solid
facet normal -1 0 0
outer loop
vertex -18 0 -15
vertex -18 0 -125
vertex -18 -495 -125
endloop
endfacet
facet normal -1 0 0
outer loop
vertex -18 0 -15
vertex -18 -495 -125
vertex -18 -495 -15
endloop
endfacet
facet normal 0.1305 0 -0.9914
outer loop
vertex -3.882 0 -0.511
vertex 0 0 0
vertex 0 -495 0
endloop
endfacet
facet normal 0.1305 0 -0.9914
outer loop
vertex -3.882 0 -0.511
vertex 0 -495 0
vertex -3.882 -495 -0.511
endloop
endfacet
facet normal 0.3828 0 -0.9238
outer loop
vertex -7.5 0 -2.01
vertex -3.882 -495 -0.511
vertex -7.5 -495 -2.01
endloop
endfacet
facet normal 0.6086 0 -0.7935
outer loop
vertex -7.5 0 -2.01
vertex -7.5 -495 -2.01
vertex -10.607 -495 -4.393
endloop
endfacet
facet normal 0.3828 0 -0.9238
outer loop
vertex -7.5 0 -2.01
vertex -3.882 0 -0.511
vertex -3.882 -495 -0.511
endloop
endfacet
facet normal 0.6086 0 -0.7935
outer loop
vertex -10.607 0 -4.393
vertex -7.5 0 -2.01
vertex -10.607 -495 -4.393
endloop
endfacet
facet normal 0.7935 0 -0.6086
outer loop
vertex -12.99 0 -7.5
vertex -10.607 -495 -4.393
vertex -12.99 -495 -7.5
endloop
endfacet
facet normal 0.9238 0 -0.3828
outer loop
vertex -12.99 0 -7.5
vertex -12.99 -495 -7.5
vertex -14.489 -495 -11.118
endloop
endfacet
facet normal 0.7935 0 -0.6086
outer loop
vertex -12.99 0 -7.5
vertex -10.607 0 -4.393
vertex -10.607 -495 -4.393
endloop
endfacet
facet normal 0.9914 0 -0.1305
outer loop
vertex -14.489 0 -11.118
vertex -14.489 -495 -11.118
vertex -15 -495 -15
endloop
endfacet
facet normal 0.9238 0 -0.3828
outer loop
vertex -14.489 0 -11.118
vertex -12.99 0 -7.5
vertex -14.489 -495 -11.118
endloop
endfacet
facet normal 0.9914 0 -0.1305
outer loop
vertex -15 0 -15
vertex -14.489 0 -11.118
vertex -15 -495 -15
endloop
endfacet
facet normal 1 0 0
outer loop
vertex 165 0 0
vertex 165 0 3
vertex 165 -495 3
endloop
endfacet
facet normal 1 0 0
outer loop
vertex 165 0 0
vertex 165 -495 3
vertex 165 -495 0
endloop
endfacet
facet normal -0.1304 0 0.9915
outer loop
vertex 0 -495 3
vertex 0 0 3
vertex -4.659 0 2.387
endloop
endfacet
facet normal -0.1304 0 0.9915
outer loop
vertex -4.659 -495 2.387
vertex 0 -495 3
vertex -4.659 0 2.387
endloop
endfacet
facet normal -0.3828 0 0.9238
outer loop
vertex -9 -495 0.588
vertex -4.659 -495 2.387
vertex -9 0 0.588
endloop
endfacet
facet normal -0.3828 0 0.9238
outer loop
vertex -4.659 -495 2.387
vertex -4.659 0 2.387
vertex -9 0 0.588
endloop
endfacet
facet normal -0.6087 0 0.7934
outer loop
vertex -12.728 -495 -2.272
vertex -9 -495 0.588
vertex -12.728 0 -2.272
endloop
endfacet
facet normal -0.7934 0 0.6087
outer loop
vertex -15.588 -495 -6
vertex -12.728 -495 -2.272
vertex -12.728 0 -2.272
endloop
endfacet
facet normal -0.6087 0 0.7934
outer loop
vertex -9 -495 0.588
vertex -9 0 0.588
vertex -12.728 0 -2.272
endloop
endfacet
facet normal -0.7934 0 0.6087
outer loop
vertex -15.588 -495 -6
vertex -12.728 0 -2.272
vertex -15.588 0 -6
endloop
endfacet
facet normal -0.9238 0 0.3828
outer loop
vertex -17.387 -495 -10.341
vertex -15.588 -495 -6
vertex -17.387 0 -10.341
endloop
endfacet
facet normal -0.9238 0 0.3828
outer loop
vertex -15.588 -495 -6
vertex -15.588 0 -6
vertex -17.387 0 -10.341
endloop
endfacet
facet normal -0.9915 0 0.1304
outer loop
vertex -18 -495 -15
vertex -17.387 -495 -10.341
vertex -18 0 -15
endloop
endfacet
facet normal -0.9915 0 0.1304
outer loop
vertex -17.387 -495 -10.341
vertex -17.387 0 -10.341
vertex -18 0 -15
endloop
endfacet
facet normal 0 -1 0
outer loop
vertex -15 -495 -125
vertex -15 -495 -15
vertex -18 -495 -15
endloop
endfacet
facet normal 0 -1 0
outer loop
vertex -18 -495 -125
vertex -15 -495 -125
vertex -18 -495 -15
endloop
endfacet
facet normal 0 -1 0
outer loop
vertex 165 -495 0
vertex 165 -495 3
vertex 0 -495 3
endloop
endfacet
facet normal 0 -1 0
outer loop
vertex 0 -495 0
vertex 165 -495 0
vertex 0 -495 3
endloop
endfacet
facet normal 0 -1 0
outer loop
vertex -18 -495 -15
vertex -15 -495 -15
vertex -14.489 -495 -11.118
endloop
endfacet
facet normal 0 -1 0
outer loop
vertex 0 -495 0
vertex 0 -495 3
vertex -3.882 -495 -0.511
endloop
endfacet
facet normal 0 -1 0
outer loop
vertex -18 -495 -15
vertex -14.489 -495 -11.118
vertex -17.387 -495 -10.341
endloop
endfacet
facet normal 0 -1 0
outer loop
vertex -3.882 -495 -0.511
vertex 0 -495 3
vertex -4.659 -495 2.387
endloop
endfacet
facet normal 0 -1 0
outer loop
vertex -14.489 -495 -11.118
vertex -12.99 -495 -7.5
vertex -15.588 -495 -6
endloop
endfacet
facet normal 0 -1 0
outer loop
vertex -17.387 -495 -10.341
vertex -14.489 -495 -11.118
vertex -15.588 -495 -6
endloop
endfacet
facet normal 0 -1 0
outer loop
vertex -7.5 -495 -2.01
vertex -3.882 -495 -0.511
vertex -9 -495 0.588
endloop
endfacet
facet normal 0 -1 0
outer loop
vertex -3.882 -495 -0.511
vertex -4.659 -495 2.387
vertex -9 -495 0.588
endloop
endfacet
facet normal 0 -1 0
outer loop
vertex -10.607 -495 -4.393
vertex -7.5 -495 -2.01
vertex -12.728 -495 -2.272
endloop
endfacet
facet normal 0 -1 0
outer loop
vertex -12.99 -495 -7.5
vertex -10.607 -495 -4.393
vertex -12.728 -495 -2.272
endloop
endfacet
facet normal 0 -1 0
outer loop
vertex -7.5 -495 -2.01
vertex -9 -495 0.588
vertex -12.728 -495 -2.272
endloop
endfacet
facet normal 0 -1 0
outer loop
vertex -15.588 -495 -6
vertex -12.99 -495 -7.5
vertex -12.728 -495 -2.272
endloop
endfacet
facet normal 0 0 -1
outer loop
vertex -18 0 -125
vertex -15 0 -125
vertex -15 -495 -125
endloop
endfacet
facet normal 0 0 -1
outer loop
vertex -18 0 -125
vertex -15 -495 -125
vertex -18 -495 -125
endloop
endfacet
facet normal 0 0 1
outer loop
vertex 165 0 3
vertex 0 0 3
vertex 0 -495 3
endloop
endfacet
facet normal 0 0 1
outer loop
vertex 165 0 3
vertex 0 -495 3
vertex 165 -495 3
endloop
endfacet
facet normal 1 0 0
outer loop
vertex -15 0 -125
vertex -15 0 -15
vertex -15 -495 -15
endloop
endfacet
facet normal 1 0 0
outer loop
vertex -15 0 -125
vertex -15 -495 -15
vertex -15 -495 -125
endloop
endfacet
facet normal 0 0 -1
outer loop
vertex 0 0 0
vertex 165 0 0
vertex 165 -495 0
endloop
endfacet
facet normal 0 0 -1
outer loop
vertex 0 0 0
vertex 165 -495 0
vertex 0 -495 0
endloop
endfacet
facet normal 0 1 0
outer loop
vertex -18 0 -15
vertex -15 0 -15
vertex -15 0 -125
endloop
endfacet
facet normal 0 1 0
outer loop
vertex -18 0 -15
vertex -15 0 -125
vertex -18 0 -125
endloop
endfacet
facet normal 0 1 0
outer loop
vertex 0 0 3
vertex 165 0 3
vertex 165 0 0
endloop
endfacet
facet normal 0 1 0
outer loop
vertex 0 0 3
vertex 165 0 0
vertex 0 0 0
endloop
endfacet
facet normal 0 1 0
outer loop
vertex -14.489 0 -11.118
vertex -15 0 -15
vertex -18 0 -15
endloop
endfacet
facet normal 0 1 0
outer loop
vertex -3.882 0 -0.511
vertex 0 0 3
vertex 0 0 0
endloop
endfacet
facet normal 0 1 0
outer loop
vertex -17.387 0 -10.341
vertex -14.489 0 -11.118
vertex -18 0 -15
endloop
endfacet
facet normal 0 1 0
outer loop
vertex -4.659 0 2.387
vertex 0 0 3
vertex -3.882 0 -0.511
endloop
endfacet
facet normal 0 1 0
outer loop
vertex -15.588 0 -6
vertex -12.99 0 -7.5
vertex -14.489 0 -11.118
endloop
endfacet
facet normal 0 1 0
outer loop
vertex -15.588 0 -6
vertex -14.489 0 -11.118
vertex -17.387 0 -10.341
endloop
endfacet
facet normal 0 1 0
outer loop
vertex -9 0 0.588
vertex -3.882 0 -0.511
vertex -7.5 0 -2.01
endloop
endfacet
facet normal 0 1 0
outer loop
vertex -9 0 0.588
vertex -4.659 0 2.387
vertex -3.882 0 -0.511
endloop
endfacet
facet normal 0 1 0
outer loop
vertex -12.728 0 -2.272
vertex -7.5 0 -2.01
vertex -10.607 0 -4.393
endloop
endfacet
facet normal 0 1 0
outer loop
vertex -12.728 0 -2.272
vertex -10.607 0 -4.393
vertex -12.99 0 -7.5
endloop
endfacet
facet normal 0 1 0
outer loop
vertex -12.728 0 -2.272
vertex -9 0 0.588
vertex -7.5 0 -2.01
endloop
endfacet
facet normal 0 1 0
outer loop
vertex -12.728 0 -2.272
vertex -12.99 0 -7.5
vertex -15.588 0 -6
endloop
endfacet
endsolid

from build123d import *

# Parameters (mm, degrees)
PAD_DEPTH = 495


with BuildPart() as part:
    # Sketch → Pad (new body)
    with BuildSketch(Plane.XZ):
        with BuildLine():
            Line((0, 3), (165, 3))
            Line((165, 3), (165, 0))
            Line((165, 0), (0, 0))
            ThreePointArc((0, 0), (-10.606602, -4.393398), (-15, -15))
            Line((-15, -15), (-15, -125))
            Line((-15, -125), (-18, -125))
            Line((-18, -125), (-18, -15))
            ThreePointArc((0, 3), (-12.727922, -2.272078), (-18, -15))
        make_face()
    extrude(amount=PAD_DEPTH)


solid = part.part
